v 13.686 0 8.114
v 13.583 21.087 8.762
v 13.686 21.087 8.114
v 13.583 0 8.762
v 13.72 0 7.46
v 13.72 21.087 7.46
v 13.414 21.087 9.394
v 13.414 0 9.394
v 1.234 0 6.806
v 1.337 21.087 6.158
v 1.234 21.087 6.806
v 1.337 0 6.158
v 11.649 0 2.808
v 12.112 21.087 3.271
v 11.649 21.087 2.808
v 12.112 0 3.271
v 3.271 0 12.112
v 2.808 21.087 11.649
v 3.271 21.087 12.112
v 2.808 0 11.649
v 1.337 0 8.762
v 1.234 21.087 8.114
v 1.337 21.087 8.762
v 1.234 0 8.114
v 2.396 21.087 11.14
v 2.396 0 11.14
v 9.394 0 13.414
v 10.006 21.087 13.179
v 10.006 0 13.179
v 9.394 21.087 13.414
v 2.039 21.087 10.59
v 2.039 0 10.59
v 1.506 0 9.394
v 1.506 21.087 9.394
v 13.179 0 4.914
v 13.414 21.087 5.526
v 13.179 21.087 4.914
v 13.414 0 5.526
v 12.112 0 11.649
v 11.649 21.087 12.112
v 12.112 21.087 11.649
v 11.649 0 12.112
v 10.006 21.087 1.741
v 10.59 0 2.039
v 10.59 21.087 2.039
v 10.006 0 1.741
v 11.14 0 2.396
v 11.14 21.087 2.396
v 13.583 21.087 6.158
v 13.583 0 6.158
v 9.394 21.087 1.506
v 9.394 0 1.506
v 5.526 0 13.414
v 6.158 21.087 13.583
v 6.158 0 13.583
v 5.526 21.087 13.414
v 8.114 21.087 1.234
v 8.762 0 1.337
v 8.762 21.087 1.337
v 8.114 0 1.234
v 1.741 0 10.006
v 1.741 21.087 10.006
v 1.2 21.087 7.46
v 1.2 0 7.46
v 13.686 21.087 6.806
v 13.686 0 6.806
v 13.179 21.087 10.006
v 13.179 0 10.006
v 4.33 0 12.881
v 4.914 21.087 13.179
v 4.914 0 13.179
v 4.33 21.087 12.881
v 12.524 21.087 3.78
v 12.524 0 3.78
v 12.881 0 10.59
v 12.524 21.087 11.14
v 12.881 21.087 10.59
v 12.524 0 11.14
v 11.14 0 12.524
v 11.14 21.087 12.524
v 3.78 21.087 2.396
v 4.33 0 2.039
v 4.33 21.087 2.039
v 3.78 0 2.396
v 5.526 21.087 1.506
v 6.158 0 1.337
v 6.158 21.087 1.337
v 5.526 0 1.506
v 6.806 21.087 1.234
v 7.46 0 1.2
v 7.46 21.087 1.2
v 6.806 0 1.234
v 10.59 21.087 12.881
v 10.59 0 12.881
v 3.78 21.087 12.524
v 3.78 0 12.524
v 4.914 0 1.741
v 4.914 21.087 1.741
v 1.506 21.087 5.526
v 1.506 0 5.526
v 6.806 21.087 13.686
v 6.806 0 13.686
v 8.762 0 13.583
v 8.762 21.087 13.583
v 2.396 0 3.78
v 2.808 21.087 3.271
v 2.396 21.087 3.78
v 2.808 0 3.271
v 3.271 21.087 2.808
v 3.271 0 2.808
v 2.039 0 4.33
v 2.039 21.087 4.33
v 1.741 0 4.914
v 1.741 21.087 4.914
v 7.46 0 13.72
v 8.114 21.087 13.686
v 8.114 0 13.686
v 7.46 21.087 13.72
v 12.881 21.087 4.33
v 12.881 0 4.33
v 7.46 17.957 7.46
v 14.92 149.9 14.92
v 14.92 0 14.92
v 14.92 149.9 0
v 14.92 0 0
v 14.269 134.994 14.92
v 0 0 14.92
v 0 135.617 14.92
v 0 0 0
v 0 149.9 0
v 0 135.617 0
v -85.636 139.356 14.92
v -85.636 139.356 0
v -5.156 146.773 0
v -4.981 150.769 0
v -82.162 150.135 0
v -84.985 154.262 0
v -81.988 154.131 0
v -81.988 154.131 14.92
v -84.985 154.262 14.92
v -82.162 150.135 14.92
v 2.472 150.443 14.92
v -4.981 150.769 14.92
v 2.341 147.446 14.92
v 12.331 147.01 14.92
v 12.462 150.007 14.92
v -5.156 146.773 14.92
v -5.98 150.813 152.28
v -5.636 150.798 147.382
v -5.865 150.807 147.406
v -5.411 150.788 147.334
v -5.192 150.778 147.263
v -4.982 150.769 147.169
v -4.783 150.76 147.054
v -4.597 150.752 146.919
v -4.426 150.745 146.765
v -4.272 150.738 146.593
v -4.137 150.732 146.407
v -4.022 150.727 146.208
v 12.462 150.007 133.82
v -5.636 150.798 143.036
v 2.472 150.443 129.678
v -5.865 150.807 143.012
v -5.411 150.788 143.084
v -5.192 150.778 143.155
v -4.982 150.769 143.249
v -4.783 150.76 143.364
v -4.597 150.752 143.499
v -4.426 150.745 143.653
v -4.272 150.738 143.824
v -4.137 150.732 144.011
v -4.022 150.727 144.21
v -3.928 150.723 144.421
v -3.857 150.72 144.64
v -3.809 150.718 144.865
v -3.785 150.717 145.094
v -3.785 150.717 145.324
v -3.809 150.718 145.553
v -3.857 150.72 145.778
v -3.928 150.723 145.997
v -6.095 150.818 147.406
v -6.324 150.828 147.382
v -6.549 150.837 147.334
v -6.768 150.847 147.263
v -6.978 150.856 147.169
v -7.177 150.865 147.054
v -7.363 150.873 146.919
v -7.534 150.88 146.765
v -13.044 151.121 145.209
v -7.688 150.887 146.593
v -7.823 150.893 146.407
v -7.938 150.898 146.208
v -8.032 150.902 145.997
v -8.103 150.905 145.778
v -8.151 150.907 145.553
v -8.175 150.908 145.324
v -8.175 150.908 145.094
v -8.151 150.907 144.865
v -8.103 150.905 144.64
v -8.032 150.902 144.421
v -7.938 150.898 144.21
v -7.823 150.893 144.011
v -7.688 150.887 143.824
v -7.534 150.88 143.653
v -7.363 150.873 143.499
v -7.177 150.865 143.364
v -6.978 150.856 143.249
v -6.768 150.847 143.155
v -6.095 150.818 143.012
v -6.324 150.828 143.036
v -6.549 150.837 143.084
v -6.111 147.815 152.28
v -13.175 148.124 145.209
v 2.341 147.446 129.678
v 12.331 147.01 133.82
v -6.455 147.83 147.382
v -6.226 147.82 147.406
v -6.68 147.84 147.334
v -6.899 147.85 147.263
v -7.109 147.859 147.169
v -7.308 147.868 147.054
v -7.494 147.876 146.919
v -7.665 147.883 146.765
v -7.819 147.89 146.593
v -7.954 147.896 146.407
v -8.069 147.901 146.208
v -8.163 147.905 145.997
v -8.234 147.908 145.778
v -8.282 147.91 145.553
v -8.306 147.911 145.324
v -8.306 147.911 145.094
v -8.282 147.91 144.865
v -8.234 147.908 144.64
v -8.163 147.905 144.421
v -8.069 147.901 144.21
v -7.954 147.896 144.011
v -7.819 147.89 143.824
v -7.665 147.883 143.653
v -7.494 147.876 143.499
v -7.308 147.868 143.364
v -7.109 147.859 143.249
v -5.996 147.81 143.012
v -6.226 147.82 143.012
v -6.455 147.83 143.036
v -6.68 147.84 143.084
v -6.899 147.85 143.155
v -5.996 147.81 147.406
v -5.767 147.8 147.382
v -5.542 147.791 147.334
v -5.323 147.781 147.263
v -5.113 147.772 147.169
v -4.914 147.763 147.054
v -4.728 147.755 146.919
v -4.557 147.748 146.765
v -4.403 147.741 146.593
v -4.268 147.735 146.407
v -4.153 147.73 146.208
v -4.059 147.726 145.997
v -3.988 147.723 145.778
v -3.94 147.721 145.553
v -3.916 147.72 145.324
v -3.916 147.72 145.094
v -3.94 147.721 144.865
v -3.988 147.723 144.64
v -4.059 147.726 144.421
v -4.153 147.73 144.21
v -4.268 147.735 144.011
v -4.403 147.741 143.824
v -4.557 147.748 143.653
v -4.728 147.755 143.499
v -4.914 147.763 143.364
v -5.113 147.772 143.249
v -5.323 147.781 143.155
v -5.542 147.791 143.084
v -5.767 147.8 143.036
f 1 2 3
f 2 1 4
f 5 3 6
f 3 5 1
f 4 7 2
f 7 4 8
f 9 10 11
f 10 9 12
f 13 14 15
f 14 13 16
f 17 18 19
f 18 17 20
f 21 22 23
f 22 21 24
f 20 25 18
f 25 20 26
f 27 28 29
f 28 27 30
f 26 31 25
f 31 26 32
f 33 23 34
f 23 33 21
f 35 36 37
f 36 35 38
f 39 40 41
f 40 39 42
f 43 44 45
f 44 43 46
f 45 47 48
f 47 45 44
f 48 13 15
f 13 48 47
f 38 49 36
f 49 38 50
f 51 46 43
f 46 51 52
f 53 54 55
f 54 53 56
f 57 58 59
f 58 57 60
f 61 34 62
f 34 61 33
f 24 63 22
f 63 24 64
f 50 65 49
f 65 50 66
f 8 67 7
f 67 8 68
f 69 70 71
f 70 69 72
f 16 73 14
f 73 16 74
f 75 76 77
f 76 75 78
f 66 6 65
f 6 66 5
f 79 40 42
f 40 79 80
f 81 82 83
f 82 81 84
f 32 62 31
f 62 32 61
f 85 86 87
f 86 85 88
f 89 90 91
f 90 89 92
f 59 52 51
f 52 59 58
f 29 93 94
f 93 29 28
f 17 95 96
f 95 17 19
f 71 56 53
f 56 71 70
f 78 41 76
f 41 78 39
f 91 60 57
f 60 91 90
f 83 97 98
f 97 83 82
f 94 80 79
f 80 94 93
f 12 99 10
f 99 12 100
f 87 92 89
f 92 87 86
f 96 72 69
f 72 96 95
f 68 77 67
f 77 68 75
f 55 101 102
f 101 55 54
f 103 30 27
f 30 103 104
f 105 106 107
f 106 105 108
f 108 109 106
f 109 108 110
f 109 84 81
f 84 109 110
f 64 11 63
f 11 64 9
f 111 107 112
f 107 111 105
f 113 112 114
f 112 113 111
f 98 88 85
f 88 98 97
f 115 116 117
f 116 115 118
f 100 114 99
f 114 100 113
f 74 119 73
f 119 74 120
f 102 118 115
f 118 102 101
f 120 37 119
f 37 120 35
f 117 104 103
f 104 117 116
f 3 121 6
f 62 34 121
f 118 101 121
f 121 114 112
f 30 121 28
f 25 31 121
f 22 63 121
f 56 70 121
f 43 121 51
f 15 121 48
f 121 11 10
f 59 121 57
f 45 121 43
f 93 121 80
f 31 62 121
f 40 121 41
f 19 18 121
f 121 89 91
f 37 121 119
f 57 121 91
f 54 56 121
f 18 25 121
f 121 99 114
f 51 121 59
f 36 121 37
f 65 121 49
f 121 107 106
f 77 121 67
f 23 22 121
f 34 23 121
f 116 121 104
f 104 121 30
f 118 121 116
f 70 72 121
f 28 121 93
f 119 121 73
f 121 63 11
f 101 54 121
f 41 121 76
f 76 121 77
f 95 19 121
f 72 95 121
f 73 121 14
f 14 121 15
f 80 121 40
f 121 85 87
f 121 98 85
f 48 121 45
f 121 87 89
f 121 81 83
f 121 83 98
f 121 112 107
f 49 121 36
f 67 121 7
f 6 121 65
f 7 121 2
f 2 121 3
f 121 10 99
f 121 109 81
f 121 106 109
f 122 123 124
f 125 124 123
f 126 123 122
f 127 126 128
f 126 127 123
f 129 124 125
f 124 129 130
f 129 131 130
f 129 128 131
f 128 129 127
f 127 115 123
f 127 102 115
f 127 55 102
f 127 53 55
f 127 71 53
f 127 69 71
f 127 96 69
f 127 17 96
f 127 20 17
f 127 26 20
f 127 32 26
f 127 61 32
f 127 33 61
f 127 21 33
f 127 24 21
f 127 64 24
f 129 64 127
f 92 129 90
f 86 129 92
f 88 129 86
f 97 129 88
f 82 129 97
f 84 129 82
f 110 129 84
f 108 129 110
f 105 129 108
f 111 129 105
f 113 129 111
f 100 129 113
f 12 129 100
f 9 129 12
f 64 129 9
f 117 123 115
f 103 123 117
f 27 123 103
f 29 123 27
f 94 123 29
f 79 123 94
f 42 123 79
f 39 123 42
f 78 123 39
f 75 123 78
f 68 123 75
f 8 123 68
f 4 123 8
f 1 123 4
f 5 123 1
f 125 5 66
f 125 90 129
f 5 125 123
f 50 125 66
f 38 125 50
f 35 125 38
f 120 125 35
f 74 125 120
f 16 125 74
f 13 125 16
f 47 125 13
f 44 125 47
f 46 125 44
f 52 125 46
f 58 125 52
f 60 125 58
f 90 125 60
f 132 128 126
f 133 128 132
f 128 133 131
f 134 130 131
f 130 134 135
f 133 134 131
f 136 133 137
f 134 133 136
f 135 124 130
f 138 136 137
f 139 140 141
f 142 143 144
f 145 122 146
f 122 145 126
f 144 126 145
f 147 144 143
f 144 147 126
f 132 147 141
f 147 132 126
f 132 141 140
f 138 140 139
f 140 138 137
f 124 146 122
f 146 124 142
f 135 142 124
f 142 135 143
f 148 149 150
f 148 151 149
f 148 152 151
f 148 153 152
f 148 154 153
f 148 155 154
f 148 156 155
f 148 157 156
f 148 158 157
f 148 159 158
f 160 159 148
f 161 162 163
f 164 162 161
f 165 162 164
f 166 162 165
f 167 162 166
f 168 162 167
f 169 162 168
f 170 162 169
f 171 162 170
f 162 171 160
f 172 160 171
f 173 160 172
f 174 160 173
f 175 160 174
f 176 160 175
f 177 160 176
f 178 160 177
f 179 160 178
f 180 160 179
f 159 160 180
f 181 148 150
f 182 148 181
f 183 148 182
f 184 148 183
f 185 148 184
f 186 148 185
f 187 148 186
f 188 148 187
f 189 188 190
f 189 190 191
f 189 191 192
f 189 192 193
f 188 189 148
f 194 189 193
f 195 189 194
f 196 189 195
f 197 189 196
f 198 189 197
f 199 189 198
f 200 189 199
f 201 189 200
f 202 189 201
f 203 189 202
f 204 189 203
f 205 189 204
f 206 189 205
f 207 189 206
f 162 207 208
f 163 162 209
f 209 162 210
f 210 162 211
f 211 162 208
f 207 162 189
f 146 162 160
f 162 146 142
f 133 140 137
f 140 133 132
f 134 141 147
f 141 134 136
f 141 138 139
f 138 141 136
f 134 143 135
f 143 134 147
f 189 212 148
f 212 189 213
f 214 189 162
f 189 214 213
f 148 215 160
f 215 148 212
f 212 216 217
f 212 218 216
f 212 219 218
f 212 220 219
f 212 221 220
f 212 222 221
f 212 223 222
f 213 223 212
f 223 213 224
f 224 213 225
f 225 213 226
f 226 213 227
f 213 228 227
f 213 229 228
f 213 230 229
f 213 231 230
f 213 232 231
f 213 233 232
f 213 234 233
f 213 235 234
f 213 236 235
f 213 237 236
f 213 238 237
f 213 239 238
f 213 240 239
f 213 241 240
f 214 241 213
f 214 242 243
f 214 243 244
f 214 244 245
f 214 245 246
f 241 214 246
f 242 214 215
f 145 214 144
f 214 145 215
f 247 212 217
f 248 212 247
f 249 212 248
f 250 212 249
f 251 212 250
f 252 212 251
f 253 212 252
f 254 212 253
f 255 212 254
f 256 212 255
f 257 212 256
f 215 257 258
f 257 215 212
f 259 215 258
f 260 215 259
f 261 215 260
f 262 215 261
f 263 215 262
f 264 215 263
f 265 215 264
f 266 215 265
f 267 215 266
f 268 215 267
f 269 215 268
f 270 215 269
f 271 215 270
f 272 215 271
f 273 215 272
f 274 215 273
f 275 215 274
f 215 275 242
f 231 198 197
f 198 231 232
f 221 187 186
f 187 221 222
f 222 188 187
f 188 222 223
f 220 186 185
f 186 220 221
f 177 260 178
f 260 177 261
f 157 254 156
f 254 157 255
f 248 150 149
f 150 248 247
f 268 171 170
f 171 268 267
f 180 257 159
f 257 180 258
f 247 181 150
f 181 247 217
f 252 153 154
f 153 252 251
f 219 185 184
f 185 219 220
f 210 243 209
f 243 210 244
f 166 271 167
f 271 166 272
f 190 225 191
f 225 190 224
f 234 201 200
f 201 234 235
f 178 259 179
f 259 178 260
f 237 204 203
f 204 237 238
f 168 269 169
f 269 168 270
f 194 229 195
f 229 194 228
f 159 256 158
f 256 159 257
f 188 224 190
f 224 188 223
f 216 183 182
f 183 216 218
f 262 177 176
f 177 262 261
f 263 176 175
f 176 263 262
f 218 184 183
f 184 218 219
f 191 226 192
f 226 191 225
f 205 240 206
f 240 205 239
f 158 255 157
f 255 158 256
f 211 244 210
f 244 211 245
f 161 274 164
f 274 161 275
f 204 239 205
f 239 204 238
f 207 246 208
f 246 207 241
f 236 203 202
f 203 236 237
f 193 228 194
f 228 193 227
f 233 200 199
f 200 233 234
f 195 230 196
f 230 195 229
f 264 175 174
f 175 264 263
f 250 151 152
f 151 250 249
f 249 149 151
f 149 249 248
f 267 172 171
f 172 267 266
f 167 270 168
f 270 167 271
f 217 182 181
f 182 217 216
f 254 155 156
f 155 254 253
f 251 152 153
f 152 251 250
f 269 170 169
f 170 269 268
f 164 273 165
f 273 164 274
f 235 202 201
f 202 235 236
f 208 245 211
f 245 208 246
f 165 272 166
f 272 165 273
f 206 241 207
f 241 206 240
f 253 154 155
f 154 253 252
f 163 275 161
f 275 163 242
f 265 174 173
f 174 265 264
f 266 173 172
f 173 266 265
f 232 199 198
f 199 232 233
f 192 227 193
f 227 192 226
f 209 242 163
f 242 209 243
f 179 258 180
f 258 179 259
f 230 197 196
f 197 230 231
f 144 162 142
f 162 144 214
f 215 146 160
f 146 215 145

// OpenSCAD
// Printrbot Simple Metal 1403 Spool Holder
// author: fiveangle@gmail.com
// date: 2015apr15
// ver: 1.0
// known issues: there's a bug when armWidth < stemWidth and armAngle != 90 where stem doesn't extend to arm full-width, but not really interested in fixing right now since it doesn't affect me.

// adjust to increase/decrease polygon count at expense of processing time (above 100 is probably useless)
$fn = 60; //

// actual is 148mm, but keep <125mm to fit printrbot metal build platform.
yZrodDistanceToYCenter = 124.9;

// this determines how long the 45-deg guideArm offset is
xZrodDistanceToYCenter = 6;
nozzleWidth = 0.4;

// increase to make stronger part around zrod.
shellsAroundZrod = 3;
// use printOnlyToHeight parameter to print just the zrod bearing surface to calibrate this value for tightest fit.
zRodBearingRadius = 6.26;
// this is length of zrod above z bearing block when printer head is at maximum z height
zRodBearingLength = 19;

// set by "shellsAroundZrod"; increase for strength, or replace with arbitrary width as desired.
stemWidth = 2 * (zRodBearingRadius + (shellsAroundZrod * nozzleWidth));

// symetrical be default, or replace with arbitrary length.
stemLength = stemWidth;

// maximum size that will print on Printerbot Metal. Default: 149.9
stemHeight = 149.9;

// make 13.4mm if you want to fit Taulman filament spools with 19mm holes.
armWidth = stemWidth;
armLength = 100;
armHeight = armWidth;

// increasing this may require shortening stemHeight, or rotating STL in your slicer so that arm is parallel to x or x printer axis.
armAngle = 92.5;
lipThickness = 3;
lipHeight = 4;

// increase to handle spools with greater permieter backset
lipInnerExtra = 5;
guideWidth = stemWidth;
guideLength = yZrodDistanceToYCenter - xZrodDistanceToYCenter;
guideHeight = 3;
guideWidth = 10;

// this needs to be approx 2.2mm radius, but you'll likely get a better print by making this "0" and drilling the hole manually afterward - your choice
guideHole = 2.2;
// "False" here if you don't want to include the filament guide arm
guideArm = 1; // [0:False,1:True]

// "True" here will generate a test print of just the zrod bearing section of the stem to calibrate for your zRodBearingRadius before printing entire holder.
printOnlyZrodBearing = 0; // [0:False,1:True]
printAboveZrod = printOnlyZrodBearing ? 0 : 500;
printOnlyToHeight = (zRodBearingLength + (zRodBearingRadius / 3) + 3) + printAboveZrod;

intersection() {
    translate([-5000, -10000 + printOnlyToHeight, 0]) {
        cube([10000, 10000, 10000]); // leave minimum of the zrod bearing surface to test-print tightness of zRodBearingRadius
    }

    union() {
        difference() {
            cube([stemWidth, stemHeight, stemLength]);
            translate([(stemWidth / 2), zRodBearingLength + zRodBearingRadius / 3, (stemWidth / 2)]) {
                rotate(a = 90, v = [1, 0, 0]) {
                    difference() {
                        cylinder(h = 1 + zRodBearingLength + zRodBearingRadius / 3, r = zRodBearingRadius);
                        cylinder(h = zRodBearingRadius / 2, r1 = zRodBearingRadius, r2 = 0, center = false);
                    }
                }
            }
        }
        translate([stemWidth, stemHeight, armWidth]) {
            rotate(a = 180 - armAngle, v = [0, 0, 1]) {
                rotate(a = 180, v = [0, 1, 0]) {
                    difference() {
                        cube([armHeight, armLength, armWidth]); // arm
                        translate([0, stemWidth + lipInnerExtra, 0]) {
                            cube([lipHeight, armLength - stemWidth - lipThickness - lipInnerExtra, armWidth]); // lip cutout
                        }
                    }
                    if (guideArm) {
                        translate([guideHeight, (stemWidth - guideWidth) / 2, 0]) {
                            rotate(a = 90, v = [0, 1, 0]) {
                                rotate(a = -90, v = [1, 0, 0]) {
                                    union() {
                                        cube([guideLength, guideHeight, guideWidth]);
                                        translate([guideLength, 0, 0]) {
                                            rotate(a = -45, v = [0, 1, 0]) {
                                                difference() {
                                                    cube([sqrt(pow(xZrodDistanceToYCenter + lipInnerExtra + (stemWidth / 2), 2) + pow(xZrodDistanceToYCenter + lipInnerExtra + (stemWidth / 2), 2)), guideHeight, guideWidth]);
                                                    translate([sqrt(pow(xZrodDistanceToYCenter + lipInnerExtra + (stemWidth / 2), 2) + pow(xZrodDistanceToYCenter + lipInnerExtra + (stemWidth / 2), 2)) - guideWidth / 2, 0, guideWidth / 2]) {
                                                        rotate(a = -90, v = [1, 0, 0]) {
                                                            cylinder(h = guideHeight, r = guideHole, center = false);
                                                        }
                                                    }
                                                }
                                            }
                                        }
                                    }
                                }
                            }
                        }
                    }
                }
            }
        }
    }
}
